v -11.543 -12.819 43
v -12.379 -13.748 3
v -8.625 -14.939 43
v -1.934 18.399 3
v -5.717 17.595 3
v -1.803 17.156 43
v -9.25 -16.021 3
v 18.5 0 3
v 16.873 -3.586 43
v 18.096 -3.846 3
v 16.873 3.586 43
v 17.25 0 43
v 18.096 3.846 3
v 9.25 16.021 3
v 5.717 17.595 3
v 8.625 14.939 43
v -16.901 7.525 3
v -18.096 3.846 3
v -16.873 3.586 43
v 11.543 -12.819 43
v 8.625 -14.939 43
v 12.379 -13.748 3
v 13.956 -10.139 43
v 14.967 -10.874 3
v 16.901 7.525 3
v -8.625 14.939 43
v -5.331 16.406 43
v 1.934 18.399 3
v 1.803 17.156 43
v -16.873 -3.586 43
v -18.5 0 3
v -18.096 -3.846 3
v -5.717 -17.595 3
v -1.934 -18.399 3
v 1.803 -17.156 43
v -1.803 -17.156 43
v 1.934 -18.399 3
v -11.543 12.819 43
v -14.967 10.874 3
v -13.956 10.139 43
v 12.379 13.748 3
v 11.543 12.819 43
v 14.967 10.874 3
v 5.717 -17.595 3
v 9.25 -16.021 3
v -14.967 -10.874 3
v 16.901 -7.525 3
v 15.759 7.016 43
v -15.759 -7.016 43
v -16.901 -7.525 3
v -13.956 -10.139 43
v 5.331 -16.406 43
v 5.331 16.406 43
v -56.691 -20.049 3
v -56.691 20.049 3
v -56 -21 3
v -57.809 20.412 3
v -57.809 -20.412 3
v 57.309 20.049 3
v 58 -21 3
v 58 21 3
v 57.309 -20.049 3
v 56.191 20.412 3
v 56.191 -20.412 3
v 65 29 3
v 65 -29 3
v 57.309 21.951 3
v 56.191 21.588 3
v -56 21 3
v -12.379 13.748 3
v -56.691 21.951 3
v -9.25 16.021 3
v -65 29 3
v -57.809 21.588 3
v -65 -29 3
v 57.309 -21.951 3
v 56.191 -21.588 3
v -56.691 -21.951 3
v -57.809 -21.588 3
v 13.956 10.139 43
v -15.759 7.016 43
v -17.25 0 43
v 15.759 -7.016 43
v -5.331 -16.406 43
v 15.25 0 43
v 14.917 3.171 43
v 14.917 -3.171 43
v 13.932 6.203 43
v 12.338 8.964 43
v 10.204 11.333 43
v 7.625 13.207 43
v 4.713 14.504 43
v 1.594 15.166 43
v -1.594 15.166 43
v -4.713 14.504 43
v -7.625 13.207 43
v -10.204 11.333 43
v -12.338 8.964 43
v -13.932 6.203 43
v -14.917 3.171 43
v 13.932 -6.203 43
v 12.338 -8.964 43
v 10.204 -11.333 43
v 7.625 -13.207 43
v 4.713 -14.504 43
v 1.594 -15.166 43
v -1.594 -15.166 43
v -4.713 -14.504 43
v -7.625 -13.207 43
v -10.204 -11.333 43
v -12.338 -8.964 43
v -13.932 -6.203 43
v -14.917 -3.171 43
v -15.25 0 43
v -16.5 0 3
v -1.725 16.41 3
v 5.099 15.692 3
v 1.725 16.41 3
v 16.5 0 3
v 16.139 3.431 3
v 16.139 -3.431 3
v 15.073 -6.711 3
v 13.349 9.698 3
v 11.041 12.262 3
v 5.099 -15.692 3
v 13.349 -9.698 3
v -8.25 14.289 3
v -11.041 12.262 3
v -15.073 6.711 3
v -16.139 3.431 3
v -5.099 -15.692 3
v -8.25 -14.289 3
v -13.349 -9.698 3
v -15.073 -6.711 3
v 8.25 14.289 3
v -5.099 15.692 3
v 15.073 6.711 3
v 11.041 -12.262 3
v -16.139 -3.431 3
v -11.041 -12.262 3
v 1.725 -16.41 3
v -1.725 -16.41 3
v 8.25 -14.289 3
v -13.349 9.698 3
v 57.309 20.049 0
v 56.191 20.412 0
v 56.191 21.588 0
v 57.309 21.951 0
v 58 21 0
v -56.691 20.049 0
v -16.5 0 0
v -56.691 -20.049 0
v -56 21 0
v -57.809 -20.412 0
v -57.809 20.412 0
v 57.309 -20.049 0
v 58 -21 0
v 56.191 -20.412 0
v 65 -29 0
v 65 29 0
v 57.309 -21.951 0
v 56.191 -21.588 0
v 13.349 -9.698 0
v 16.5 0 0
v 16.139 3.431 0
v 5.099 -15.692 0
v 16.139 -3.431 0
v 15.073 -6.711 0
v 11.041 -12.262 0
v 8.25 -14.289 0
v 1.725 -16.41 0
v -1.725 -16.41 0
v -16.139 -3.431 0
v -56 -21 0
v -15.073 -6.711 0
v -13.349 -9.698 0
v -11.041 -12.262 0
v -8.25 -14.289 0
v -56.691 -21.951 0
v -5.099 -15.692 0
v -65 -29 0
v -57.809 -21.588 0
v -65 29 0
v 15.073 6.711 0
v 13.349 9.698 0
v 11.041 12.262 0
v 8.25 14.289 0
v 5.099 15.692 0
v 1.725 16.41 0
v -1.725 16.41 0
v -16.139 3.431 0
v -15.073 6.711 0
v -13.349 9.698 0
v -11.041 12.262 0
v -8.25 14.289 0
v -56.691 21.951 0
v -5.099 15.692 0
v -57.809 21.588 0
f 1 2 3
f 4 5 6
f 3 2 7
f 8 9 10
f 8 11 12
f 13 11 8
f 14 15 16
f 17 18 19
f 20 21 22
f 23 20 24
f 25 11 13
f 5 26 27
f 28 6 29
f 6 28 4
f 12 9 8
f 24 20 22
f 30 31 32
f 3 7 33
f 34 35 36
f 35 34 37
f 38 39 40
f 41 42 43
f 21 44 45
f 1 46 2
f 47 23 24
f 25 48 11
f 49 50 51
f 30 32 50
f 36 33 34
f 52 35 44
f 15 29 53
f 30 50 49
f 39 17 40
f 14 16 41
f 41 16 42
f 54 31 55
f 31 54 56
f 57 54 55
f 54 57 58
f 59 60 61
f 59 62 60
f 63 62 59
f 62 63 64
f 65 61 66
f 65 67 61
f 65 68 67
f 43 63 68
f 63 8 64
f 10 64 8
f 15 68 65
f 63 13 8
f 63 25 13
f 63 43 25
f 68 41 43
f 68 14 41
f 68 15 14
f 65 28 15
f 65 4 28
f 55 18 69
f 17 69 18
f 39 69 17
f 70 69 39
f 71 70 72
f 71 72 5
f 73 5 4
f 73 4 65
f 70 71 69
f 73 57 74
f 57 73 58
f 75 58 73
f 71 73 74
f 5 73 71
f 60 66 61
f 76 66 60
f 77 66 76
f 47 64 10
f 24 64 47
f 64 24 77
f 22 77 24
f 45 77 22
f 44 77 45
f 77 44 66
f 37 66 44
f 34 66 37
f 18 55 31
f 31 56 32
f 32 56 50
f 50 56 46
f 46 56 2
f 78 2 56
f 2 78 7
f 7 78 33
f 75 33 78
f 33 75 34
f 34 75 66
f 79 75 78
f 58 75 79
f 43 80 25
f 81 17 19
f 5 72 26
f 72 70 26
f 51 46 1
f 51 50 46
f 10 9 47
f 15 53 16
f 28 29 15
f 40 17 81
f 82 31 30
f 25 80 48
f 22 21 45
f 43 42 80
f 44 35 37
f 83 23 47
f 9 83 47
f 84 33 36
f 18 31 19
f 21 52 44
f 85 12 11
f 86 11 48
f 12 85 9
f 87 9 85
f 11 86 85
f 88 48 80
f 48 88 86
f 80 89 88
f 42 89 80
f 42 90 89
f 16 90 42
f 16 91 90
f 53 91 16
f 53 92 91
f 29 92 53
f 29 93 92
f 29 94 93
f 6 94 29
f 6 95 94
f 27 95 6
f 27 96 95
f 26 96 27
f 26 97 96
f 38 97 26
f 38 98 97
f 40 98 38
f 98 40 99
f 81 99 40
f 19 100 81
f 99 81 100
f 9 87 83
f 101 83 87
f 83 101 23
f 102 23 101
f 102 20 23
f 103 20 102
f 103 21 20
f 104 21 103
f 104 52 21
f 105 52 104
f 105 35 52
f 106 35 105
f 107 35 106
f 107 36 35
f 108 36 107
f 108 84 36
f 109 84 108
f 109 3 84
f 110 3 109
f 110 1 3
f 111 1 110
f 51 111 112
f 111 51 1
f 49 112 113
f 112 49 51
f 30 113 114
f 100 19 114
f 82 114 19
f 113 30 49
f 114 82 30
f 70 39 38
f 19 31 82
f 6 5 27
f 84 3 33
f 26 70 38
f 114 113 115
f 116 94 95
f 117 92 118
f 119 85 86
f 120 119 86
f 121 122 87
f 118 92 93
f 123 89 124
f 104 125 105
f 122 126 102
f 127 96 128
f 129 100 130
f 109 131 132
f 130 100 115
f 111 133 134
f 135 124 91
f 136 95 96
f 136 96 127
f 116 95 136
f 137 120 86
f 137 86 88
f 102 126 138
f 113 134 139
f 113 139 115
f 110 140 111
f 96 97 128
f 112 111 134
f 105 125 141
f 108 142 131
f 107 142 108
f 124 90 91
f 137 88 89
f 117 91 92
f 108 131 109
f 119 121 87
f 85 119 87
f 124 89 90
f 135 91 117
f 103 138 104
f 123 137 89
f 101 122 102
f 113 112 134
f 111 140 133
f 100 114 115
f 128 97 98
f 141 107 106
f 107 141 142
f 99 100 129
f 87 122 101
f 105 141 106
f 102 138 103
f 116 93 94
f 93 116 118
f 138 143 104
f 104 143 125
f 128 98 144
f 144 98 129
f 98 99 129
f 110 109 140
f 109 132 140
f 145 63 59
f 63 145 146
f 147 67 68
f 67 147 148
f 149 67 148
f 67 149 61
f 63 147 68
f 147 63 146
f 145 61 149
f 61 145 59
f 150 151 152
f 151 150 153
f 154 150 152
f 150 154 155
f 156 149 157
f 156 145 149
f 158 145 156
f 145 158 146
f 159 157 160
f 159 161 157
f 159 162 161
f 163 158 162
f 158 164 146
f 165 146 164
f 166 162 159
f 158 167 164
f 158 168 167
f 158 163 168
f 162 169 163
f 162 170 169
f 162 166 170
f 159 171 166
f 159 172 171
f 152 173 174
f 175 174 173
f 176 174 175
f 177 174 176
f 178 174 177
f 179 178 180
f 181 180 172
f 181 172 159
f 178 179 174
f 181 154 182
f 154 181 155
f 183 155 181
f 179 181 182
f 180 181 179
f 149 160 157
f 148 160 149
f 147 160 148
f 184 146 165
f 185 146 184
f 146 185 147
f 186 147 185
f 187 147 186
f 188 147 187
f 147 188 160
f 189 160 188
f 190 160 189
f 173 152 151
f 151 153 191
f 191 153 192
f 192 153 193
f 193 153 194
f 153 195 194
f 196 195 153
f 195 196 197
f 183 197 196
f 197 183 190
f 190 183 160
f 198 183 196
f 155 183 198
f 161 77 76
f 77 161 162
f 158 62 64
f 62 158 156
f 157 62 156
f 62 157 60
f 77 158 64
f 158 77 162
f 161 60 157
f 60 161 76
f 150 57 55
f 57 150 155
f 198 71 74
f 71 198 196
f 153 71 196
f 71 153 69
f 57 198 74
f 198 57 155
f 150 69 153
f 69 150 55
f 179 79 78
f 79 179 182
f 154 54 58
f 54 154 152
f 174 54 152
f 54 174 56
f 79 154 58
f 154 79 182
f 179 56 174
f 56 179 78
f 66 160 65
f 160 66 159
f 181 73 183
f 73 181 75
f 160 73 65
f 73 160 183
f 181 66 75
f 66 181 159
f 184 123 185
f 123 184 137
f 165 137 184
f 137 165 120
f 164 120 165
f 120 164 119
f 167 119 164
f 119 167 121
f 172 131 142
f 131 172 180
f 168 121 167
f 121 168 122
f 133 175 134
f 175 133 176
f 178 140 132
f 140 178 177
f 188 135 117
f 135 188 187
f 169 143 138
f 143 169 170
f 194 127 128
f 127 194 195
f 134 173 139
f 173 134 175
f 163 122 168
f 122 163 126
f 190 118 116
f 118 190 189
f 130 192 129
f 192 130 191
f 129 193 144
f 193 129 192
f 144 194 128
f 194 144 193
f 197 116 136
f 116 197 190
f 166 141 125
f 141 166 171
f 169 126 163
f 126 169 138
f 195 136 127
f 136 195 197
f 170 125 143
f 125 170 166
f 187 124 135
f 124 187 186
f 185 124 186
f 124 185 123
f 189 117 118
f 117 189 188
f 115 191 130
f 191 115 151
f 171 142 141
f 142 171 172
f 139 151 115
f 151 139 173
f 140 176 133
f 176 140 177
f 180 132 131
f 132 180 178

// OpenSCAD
// Plate Dimensions
plate_width = 130;
plate_height = 58;
plate_thickness = 3;

// Screw Hole Variables
screw_hole_diameter = 2;
screw_hole_center_distance_from_side = 8;

// Hose Adapter Variables
hose_adapter_lower_diameter = 37;
hose_adapter_upper_diameter = 34.5;
hose_adapter_wall_thickness = 2;
hose_adapter_height = 40;

// Inner Hose Adapter Calculated Variables
inner_hose_adapter_lower_diameter = hose_adapter_lower_diameter - hose_adapter_wall_thickness * 2;
inner_hose_adapter_upper_diameter = hose_adapter_upper_diameter - hose_adapter_wall_thickness * 2;

// Hose Adapter
translate([0,0,plate_thickness])
difference() {
  cylinder(r1 = hose_adapter_lower_diameter/2, r2 = hose_adapter_upper_diameter/2, h = hose_adapter_height);
  cylinder(r1 = inner_hose_adapter_lower_diameter/2, r2 = inner_hose_adapter_upper_diameter/2, h = hose_adapter_height);
}

difference() {
  // Plate
  translate([-plate_width/2, -plate_height/2, 0])
  cube([plate_width,plate_height,plate_thickness]);

  // Hose Hole
  cylinder(r = inner_hose_adapter_lower_diameter/2, h = plate_thickness);

  // Screw Holes
  for(a = [plate_width/2-screw_hole_center_distance_from_side,-plate_width/2+screw_hole_center_distance_from_side])
    for(b = [plate_height/2-screw_hole_center_distance_from_side,-plate_height/2+screw_hole_center_distance_from_side])
      translate([a, b, 0])
      cylinder(r = screw_hole_diameter/2, h = plate_thickness);
}
